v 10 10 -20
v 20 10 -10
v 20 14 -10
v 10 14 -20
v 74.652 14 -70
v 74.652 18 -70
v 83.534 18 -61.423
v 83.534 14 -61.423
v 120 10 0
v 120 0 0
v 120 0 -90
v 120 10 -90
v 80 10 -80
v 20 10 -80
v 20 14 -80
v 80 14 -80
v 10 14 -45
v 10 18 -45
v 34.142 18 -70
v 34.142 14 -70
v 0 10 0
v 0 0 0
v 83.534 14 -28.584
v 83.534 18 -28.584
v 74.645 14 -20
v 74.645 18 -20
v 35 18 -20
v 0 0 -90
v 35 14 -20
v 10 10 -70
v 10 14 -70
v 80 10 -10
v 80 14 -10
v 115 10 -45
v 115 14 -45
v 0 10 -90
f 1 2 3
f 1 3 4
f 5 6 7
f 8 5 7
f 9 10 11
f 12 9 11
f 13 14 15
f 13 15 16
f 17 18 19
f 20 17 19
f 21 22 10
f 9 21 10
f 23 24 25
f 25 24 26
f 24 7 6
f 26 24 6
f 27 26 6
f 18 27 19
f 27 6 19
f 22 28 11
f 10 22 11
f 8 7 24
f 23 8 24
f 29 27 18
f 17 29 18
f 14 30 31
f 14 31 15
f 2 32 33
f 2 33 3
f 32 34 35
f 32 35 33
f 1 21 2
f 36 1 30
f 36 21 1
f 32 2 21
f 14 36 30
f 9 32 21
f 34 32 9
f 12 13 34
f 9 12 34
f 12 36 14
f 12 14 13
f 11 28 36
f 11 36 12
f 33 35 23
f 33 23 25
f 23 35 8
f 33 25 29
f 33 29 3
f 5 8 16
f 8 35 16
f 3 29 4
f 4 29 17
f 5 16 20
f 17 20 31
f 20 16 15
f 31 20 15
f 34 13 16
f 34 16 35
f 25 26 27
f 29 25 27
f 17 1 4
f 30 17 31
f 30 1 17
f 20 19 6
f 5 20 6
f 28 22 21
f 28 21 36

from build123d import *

# Parameters (mm, degrees)
SKETCH1_W           = 120
SKETCH1_H           = 90
BOSS_EXTRUDE1_DEPTH = 10
BOSS_EXTRUDE2_DEPTH = 4
BOSS_EXTRUDE3_DEPTH = 4


with BuildPart() as part:
    # Sketch1 → Boss-Extrude1 (new body)
    with BuildSketch(Plane(origin=(0, 0, 0), x_dir=(1, 0, 0), z_dir=(0, 1, 0))):
        with Locations((60, 45)):
            Rectangle(SKETCH1_W, SKETCH1_H)
    extrude(amount=BOSS_EXTRUDE1_DEPTH)

    # Sketch2 → Boss-Extrude2 (add)
    with BuildSketch(Plane(origin=(0, 10, 0), x_dir=(1, 0, 0), z_dir=(0, 1, 0))):
        Polygon((10, 70), (20, 80), (80, 80), (115, 45), (80, 10), (20, 10), (10, 20), align=None)
    extrude(amount=BOSS_EXTRUDE2_DEPTH)

    # Sketch3 → Boss-Extrude3 (add)
    with BuildSketch(Plane(origin=(0, 18, 0), x_dir=(-1, 0, 0), z_dir=(0, -1, 0))):
        Polygon((-10, 45), (-34.14221937, 70), (-74.652034735, 70), (-83.534243972, 61.422550244), (-83.534243972, 43.169206873), (-83.534243972, 28.58424312), (-74.645, 20), (-35, 20), align=None)
    extrude(amount=BOSS_EXTRUDE3_DEPTH)


solid = part.part
